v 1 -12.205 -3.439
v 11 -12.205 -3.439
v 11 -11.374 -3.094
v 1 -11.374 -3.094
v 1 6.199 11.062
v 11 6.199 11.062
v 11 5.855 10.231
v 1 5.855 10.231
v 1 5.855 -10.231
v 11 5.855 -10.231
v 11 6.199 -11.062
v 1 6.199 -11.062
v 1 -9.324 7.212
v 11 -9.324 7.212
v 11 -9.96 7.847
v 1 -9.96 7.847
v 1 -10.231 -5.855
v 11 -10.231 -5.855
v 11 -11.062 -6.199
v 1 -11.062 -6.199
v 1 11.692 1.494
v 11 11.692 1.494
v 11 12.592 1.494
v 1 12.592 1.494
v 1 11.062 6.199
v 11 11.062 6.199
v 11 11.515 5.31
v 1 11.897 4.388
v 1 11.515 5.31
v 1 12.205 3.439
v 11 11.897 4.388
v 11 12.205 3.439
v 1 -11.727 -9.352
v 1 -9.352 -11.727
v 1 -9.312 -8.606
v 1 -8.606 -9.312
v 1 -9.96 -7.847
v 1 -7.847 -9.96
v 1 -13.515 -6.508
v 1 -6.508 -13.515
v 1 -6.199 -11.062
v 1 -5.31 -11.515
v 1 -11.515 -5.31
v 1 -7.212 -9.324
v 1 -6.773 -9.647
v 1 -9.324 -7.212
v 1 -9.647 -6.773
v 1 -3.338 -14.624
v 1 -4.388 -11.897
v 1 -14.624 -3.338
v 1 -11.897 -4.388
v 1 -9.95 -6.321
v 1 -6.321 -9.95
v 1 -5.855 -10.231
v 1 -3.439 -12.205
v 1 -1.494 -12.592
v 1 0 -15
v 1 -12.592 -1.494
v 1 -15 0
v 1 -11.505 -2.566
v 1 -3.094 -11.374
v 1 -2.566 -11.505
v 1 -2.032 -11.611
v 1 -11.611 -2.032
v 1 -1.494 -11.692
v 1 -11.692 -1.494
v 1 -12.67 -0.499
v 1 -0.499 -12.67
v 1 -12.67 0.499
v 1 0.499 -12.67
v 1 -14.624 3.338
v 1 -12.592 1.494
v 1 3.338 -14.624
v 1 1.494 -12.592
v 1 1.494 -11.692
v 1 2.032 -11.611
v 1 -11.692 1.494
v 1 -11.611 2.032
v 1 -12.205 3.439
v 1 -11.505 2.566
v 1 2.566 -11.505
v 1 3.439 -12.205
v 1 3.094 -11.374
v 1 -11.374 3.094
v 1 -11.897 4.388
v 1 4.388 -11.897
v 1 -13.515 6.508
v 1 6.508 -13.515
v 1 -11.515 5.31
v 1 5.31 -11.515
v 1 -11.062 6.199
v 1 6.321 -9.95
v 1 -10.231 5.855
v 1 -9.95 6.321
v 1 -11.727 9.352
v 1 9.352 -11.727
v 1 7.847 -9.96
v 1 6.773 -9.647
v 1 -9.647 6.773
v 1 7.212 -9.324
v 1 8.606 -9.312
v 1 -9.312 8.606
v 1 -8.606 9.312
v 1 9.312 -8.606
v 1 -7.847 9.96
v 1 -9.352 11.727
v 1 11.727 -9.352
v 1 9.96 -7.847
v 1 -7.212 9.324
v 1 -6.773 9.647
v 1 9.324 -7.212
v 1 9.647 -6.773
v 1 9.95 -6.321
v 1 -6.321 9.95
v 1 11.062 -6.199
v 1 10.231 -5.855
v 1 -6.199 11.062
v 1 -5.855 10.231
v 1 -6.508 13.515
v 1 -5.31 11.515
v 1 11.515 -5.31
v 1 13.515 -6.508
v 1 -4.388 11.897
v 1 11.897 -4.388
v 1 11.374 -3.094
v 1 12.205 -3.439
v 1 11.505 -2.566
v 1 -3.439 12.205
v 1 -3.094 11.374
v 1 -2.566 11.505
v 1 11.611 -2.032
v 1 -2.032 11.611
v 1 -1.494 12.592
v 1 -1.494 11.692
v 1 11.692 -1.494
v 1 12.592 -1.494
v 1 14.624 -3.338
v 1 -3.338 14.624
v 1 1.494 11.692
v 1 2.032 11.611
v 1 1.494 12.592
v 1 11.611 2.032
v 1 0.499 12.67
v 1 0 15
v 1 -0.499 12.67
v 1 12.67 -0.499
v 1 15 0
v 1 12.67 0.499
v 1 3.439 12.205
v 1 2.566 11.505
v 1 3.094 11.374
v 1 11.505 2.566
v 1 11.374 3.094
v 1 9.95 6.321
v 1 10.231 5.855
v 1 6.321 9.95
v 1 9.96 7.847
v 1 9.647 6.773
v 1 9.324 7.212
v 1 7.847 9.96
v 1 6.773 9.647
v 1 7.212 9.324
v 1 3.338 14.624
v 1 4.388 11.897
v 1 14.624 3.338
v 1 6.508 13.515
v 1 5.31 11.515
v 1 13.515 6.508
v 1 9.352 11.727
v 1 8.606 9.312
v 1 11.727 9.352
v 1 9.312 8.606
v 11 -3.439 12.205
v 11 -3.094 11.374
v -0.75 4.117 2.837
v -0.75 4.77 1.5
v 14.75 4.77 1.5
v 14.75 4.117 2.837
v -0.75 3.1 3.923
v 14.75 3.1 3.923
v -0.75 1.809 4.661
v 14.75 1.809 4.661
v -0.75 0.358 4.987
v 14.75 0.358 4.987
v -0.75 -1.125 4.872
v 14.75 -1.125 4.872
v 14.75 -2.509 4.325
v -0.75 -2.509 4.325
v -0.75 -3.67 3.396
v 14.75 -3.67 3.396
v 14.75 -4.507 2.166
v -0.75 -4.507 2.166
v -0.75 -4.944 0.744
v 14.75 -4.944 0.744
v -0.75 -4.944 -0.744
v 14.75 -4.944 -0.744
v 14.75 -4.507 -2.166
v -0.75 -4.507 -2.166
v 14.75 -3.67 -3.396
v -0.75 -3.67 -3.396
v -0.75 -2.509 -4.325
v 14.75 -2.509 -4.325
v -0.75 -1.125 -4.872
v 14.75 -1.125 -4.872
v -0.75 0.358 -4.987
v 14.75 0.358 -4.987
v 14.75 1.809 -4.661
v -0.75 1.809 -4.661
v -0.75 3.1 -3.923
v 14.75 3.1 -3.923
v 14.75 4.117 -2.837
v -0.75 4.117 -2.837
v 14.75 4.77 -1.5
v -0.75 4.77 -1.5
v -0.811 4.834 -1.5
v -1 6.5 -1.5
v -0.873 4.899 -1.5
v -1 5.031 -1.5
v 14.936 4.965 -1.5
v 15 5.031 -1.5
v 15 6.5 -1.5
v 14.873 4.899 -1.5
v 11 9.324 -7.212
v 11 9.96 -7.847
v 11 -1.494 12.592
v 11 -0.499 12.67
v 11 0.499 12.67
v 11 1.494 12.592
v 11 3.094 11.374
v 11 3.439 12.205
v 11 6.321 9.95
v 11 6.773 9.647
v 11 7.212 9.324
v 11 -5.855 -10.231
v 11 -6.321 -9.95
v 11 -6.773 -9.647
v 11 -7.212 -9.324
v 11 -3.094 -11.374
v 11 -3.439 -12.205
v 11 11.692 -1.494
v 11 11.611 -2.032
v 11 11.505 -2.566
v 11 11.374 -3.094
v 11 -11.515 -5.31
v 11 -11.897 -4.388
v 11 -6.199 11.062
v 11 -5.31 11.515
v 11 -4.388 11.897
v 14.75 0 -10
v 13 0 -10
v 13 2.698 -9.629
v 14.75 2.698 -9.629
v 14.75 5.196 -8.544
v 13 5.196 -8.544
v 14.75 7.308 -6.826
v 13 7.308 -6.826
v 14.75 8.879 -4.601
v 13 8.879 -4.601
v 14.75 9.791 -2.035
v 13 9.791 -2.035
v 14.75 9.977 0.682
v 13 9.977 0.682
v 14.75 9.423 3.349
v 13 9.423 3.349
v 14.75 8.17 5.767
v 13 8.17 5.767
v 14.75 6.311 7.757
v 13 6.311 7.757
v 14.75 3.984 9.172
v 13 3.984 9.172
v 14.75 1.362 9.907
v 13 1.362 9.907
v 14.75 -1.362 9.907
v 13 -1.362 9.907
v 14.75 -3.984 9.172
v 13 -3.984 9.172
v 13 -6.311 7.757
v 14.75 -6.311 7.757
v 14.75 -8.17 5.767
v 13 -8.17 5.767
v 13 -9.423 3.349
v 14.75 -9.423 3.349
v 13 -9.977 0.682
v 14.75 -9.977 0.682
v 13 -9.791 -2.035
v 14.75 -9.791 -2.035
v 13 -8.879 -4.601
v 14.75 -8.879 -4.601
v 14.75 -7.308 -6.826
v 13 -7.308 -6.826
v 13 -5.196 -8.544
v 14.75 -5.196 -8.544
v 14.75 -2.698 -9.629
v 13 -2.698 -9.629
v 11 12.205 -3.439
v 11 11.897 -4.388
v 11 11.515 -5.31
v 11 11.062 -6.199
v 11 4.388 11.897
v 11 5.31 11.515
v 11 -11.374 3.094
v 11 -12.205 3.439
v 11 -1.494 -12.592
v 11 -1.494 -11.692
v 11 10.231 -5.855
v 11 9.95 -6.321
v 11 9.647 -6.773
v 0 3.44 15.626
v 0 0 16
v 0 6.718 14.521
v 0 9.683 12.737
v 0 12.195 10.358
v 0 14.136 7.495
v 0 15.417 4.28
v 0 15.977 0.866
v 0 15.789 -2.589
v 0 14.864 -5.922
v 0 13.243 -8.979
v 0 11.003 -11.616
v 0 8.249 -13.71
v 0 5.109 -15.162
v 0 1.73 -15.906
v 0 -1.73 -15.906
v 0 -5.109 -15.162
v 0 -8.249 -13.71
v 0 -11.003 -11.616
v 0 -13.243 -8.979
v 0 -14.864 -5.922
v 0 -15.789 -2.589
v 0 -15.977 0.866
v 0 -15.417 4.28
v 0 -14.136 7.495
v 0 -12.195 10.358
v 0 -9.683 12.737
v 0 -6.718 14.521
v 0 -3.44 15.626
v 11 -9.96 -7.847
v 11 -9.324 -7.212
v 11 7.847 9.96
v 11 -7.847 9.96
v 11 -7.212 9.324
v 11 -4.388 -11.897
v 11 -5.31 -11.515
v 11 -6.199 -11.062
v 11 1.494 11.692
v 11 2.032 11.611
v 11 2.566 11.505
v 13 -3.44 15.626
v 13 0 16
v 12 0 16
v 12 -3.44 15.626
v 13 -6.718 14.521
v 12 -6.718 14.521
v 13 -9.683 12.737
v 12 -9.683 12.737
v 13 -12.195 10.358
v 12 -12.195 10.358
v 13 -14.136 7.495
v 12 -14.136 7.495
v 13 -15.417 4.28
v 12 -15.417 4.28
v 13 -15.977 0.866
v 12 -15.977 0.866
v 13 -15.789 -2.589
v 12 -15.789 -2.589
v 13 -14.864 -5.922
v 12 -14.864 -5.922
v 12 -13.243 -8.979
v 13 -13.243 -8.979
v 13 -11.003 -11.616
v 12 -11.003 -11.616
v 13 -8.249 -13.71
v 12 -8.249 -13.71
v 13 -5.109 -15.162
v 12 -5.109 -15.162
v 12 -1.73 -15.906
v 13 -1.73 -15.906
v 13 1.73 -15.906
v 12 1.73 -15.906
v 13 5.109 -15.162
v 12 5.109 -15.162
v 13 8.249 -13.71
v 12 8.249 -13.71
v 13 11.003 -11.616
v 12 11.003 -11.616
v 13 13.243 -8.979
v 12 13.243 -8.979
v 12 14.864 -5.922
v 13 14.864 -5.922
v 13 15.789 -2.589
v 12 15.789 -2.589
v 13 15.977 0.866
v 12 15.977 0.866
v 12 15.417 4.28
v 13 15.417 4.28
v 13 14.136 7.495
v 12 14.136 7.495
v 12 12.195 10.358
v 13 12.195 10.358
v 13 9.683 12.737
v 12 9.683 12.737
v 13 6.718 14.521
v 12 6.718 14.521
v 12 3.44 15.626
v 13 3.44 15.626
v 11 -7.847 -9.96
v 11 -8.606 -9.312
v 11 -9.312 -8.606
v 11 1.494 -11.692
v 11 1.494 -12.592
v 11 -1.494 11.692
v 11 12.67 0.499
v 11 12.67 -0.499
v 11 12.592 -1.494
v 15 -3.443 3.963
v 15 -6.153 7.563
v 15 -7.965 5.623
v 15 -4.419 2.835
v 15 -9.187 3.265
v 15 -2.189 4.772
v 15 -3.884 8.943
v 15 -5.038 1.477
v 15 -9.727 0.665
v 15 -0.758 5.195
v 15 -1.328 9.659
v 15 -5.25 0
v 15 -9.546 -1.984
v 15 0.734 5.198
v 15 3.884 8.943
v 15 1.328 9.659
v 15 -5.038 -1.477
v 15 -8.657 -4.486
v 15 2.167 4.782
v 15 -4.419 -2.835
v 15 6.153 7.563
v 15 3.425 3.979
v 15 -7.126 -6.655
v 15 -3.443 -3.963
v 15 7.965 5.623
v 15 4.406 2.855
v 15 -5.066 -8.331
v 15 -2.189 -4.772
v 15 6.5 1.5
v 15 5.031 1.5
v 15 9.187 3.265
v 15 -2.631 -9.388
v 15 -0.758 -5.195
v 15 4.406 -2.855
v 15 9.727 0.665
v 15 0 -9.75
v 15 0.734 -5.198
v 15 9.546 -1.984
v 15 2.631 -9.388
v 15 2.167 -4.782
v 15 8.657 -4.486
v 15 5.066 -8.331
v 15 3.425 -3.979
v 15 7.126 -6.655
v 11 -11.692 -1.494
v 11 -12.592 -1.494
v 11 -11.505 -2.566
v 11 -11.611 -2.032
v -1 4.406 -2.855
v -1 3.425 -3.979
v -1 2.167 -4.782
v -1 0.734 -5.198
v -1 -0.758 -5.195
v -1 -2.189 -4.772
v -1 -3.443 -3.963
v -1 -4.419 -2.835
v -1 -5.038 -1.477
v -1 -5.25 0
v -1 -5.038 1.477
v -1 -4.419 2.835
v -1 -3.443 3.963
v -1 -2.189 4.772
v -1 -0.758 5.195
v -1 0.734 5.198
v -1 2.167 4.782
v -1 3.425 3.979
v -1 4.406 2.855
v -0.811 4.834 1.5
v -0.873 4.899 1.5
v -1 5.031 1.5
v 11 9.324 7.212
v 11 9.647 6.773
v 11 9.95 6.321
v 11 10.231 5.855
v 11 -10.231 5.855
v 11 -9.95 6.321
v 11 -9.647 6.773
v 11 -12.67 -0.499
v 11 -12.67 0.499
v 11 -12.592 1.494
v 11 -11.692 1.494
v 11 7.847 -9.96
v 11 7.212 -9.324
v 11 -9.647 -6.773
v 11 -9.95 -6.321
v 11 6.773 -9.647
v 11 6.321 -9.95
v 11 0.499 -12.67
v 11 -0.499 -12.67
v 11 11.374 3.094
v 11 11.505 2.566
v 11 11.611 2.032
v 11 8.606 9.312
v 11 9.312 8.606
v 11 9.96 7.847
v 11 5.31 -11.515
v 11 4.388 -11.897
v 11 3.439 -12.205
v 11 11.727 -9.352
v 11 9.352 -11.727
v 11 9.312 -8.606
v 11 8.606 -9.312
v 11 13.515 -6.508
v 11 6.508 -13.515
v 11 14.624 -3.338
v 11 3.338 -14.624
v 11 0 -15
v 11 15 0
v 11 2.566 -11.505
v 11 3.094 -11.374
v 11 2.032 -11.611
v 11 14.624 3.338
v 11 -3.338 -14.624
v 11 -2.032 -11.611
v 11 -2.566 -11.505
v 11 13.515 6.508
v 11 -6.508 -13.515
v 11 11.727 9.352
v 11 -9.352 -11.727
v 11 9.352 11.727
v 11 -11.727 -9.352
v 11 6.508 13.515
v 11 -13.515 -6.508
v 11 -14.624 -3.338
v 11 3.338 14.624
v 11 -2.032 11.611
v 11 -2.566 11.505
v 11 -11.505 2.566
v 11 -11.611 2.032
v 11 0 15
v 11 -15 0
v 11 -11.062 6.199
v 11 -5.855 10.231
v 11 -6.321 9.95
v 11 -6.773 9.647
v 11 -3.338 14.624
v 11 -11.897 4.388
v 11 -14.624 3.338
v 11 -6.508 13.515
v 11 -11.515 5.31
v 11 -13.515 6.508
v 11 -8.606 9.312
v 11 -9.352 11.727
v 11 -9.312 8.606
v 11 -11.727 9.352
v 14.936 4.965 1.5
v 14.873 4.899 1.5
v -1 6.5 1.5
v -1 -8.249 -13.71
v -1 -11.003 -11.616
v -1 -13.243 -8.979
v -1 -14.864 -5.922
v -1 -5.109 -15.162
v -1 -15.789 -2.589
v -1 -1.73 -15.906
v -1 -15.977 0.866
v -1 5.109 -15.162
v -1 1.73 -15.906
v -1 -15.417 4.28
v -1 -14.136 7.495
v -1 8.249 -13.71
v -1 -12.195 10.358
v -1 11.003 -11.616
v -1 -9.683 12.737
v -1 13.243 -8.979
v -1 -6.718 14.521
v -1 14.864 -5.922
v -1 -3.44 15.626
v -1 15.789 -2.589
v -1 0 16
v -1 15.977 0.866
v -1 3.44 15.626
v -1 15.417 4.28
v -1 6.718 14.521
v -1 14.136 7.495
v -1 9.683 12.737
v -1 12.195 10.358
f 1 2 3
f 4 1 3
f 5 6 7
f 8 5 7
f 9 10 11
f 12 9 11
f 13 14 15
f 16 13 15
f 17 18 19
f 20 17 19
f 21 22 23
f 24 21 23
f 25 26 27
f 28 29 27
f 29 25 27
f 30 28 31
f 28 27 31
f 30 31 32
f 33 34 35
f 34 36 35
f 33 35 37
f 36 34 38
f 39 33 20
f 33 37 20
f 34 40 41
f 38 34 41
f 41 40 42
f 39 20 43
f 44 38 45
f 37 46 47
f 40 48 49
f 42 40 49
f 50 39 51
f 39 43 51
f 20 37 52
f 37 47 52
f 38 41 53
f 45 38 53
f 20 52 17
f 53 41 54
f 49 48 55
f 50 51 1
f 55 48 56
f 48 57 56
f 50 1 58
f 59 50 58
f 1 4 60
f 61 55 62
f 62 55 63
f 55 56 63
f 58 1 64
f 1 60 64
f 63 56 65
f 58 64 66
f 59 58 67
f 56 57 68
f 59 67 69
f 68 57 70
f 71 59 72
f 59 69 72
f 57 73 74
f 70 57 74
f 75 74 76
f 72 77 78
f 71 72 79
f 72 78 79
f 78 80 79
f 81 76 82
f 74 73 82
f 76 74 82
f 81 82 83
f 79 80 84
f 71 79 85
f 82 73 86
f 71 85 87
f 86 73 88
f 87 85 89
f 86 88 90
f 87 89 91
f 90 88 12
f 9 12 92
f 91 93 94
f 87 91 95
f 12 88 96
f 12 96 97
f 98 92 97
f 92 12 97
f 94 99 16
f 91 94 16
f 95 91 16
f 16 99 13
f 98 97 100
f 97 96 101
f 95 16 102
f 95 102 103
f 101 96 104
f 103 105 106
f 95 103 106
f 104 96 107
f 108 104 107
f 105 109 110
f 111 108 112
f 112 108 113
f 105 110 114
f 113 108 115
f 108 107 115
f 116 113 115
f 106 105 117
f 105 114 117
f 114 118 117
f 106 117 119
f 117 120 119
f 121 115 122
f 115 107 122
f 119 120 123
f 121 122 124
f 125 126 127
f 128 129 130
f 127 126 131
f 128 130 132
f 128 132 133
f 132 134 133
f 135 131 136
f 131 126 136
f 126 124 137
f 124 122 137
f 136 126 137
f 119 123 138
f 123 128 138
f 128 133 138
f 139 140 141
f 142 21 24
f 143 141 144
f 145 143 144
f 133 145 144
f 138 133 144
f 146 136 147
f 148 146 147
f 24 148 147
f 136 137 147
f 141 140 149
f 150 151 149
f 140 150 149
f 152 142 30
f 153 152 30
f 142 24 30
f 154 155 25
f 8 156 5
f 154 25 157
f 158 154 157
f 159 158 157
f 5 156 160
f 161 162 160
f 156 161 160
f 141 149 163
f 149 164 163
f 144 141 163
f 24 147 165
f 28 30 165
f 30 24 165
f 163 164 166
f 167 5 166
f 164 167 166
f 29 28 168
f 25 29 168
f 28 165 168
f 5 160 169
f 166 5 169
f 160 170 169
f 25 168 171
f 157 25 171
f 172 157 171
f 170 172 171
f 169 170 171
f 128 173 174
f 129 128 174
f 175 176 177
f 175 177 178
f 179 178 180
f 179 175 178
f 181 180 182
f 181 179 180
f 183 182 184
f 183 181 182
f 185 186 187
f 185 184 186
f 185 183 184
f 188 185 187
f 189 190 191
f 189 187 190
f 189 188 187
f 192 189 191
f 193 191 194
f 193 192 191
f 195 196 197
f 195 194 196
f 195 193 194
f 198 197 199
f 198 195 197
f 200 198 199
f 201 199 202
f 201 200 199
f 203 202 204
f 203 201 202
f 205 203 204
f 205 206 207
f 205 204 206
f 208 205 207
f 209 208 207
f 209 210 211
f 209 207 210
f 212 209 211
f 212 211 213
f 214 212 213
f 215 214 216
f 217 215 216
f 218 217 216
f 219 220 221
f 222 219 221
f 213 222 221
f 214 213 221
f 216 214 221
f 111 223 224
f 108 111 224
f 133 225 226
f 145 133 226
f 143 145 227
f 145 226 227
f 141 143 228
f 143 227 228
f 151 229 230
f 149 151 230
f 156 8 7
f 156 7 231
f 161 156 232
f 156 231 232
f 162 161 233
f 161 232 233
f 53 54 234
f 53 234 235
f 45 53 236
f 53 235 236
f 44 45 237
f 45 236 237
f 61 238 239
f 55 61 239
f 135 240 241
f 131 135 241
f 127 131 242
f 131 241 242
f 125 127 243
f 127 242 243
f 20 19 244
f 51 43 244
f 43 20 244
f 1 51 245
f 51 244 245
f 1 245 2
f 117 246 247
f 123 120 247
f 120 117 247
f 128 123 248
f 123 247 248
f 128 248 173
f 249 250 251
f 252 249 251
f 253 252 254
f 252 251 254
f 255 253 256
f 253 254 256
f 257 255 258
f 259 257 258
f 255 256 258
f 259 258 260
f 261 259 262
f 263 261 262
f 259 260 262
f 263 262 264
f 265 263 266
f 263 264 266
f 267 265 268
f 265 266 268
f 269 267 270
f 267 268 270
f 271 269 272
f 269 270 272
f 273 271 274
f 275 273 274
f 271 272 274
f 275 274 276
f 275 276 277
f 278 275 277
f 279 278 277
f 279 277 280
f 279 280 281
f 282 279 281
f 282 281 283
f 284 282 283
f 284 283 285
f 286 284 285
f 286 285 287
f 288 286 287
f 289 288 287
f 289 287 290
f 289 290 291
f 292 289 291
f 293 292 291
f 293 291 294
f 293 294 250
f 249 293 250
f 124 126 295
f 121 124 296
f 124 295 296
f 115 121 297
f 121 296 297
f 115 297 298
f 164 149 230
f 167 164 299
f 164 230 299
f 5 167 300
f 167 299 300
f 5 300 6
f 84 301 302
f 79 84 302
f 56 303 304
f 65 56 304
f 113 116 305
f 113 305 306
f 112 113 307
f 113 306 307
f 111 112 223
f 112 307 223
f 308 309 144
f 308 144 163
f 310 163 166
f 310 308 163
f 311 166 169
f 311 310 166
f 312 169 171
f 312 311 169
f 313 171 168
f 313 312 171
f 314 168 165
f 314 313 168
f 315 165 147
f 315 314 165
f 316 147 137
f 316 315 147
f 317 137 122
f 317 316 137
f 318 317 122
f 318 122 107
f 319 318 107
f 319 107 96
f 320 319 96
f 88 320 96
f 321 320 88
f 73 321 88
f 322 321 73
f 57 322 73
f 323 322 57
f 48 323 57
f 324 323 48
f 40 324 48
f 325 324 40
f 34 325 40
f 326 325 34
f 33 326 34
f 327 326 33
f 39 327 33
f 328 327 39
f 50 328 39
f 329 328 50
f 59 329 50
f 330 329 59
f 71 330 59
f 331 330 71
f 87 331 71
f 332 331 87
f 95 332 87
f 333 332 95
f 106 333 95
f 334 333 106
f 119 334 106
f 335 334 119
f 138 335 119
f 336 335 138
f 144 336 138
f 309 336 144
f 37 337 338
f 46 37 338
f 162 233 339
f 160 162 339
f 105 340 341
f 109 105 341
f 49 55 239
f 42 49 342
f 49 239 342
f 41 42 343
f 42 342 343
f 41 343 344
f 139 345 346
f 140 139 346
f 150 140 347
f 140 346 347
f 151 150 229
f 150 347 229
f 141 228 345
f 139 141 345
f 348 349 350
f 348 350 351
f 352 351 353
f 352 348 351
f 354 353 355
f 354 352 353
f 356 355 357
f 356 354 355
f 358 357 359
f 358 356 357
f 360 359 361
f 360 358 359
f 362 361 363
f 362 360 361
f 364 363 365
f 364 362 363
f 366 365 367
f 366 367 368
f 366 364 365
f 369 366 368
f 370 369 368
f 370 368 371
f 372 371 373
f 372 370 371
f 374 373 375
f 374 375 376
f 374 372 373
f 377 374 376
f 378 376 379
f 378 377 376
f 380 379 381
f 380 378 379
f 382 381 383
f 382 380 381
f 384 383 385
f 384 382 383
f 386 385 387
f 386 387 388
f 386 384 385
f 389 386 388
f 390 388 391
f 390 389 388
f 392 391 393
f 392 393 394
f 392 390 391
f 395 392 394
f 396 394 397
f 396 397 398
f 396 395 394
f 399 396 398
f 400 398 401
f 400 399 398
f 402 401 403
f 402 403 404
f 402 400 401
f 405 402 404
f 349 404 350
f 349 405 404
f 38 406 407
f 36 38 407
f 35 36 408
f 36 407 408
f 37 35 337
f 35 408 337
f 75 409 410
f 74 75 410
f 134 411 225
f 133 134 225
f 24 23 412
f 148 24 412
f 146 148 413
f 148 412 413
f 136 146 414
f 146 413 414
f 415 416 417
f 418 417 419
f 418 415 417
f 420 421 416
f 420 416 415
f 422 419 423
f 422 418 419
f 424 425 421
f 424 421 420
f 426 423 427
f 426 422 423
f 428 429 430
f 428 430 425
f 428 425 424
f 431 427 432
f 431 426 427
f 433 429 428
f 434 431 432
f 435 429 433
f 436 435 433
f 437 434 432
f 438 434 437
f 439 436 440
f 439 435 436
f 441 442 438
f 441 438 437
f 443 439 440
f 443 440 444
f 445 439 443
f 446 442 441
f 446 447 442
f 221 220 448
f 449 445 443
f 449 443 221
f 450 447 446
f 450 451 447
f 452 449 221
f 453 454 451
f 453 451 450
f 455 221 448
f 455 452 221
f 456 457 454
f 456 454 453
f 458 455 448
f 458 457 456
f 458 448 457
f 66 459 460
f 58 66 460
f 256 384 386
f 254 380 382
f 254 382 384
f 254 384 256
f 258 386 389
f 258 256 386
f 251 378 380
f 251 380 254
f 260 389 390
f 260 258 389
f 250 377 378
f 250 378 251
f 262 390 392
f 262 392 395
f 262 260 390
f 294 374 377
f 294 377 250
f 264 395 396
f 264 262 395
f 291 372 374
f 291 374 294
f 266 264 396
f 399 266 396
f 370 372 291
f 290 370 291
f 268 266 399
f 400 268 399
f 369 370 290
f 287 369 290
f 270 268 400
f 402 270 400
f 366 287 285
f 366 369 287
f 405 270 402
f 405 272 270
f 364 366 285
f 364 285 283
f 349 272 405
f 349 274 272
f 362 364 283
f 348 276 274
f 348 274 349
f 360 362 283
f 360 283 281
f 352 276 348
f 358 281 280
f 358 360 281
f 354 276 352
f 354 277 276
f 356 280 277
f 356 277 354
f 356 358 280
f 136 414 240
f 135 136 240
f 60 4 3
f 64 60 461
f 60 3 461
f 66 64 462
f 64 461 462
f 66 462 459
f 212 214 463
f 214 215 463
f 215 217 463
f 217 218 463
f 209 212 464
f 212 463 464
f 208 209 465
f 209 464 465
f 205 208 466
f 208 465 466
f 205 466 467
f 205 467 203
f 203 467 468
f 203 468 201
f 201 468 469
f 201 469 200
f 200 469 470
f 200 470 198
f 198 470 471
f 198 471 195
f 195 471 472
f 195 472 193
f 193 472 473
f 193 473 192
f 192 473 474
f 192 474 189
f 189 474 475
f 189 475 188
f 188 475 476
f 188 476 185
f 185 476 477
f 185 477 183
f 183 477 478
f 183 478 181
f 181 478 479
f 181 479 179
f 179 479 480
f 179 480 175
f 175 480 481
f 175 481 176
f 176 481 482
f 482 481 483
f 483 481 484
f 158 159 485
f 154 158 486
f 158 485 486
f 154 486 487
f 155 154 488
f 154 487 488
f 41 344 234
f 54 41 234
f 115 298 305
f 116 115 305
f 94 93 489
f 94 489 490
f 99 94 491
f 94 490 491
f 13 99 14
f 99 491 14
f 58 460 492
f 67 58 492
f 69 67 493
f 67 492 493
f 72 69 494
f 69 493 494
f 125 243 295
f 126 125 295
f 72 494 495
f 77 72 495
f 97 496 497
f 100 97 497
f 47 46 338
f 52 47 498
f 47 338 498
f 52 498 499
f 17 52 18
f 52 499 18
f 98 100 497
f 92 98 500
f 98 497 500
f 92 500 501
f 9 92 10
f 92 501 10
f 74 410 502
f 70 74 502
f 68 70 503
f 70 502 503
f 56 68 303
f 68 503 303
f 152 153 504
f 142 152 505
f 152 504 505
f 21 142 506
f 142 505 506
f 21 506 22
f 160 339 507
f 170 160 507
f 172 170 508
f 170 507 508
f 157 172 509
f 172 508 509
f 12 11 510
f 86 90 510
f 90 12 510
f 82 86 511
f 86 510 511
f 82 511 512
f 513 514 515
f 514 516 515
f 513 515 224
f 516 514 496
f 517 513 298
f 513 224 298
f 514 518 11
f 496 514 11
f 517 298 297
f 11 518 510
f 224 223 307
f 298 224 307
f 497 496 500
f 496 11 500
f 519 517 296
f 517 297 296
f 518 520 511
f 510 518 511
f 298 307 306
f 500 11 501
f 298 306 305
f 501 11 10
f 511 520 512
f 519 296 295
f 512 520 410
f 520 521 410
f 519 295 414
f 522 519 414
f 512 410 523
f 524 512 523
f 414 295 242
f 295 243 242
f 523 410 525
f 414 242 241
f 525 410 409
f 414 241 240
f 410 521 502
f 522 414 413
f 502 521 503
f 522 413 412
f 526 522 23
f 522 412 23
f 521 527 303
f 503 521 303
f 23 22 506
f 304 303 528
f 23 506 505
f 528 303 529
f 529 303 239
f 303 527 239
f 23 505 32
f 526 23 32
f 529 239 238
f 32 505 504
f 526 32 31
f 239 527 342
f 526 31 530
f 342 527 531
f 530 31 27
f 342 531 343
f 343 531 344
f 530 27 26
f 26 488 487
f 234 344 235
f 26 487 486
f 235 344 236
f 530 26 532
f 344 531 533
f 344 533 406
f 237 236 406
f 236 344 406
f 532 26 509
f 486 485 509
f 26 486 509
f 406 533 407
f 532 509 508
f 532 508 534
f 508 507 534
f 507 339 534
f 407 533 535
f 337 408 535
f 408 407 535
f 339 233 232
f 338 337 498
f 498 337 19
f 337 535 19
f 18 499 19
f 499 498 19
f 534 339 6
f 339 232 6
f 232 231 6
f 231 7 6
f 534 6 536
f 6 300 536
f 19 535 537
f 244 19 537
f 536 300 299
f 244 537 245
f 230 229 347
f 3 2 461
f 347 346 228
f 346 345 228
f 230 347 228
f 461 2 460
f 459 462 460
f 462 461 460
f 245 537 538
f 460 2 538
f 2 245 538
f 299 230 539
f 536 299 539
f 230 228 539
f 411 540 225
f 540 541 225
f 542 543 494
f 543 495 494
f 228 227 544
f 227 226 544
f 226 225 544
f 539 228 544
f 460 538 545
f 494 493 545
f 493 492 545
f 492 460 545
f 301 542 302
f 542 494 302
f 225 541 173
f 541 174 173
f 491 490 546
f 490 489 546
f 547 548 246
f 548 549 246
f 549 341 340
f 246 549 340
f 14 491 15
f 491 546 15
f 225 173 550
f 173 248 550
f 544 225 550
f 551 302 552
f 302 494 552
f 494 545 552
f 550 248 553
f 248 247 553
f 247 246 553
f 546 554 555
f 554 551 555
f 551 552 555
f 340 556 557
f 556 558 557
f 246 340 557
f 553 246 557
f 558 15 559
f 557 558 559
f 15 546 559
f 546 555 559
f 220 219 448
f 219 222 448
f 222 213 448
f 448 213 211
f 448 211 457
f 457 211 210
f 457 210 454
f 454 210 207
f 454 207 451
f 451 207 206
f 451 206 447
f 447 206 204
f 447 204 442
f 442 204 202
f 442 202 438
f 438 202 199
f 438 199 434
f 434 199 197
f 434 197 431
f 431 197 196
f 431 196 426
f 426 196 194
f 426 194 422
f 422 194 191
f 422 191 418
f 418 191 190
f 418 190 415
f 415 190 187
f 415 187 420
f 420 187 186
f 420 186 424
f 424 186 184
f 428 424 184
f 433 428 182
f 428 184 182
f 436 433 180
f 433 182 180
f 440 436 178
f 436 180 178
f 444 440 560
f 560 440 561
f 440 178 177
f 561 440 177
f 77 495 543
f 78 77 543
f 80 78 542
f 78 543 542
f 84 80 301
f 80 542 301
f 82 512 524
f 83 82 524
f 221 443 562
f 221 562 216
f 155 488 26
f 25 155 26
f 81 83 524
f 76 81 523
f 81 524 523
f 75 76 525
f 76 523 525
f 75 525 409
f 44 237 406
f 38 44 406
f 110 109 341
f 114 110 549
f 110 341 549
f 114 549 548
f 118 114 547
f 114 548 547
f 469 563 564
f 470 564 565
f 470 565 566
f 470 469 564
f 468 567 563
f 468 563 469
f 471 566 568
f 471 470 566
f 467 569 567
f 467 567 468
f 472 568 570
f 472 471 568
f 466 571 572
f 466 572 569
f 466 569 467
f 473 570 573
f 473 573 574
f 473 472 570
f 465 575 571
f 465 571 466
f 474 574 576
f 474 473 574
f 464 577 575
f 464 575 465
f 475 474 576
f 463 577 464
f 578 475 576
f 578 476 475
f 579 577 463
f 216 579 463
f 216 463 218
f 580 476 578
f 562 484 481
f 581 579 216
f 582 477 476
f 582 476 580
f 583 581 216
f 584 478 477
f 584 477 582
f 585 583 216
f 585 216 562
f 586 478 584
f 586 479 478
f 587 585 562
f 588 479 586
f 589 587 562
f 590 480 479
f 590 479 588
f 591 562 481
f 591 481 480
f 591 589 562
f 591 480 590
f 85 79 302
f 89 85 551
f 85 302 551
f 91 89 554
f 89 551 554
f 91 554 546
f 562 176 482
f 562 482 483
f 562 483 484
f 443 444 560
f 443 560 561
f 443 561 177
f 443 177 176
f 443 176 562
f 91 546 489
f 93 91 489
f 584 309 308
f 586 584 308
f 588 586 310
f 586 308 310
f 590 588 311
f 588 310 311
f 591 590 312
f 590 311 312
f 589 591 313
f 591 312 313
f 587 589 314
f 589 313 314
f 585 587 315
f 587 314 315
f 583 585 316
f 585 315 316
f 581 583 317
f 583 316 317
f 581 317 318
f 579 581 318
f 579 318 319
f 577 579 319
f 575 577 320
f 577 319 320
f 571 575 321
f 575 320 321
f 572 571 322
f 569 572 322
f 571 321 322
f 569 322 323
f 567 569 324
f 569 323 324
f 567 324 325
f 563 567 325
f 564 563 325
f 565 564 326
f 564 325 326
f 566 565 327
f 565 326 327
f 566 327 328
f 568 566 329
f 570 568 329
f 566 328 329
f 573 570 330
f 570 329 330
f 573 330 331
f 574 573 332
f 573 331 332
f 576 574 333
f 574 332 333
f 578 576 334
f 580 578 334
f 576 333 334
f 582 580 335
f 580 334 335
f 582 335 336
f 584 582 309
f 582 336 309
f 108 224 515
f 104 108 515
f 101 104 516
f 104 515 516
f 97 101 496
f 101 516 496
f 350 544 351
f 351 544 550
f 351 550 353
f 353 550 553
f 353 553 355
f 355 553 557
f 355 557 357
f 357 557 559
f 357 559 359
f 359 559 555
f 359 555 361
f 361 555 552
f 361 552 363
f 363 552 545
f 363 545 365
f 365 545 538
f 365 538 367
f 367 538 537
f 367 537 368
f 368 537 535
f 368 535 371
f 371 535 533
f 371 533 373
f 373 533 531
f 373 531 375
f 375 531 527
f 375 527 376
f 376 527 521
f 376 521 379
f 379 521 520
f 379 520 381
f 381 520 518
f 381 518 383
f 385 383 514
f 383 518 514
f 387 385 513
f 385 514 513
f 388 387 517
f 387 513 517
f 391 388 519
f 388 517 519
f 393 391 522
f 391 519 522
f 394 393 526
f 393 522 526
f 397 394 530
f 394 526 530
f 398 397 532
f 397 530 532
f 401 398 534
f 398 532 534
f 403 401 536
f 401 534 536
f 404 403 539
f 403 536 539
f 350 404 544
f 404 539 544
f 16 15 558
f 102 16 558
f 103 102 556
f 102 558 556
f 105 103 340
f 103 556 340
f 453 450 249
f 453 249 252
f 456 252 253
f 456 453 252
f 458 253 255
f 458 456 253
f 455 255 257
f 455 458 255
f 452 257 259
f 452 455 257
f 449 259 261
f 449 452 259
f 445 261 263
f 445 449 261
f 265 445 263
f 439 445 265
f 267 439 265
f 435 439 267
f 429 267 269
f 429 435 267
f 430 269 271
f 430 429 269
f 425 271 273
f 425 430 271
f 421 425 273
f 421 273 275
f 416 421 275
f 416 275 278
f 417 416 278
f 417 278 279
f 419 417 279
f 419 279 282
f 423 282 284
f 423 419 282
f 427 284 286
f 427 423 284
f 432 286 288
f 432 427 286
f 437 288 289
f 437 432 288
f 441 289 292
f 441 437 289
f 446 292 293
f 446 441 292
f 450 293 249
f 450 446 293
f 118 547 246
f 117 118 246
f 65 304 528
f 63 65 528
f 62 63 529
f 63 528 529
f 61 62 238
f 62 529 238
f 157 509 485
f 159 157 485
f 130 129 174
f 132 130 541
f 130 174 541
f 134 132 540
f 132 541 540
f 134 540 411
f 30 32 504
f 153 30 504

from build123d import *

# Parameters (mm, degrees)
BOSS_EXTRUDE1_START       = -13
BOSS_EXTRUDE1_DEPTH       = 14
BOSS_EXTRUDE1_START_2     = -25
BOSS_EXTRUDE1_2_OUTLINE_R = 9
BOSS_EXTRUDE1_2_DEPTH     = 12
BOSS_EXTRUDE1_START_3     = -1
BOSS_EXTRUDE1_3_OUTLINE_R = 16
BOSS_EXTRUDE1_3_DEPTH     = 2
BOSS_EXTRUDE1_4_OUTLINE_R = 14.25
BOSS_EXTRUDE1_4_DEPTH     = 0.9999999
SKETCH5_R                 = 16
BOSS_EXTRUDE3_DEPTH       = 2
SKETCH6_R                 = 10
BOSS_EXTRUDE4_DEPTH       = 12
CHAMFER1_SIZE             = 1
CUT_EXTRUDE1_START        = -10
SKETCH2_R                 = 10
SKETCH2_R_2               = 7.5
CUT_EXTRUDE1_DEPTH        = 10
CUT_EXTRUDE2_DEPTH        = 28.712812921
CUT_EXTRUDE2_DEPTH_BACK   = 28.712812921
SKETCH4_R                 = 5
CUT_EXTRUDE3_START        = -10
SKETCH7_R                 = 7.5
CUT_EXTRUDE3_DEPTH        = 10
CHAMFER2_SIZE             = 0.25
SKETCH8_W                 = 3
SKETCH8_H                 = 3
CUT_EXTRUDE4_DEPTH        = 28.712812921


with BuildPart() as part:
    # Boss-Extrude1: read off the stored shape, not the designer's step
    # Boss-Extrude1 outline → Boss-Extrude1 (new body)
    with BuildSketch(Plane.ZY.offset(BOSS_EXTRUDE1_START)):
        with BuildLine():
            ThreePointArc((-1.493827307, 11.692460658), (-2.299627171, 11.561006493), (-3.094394503, 11.374088047))
            Line((-3.094394503, 11.374088047), (-3.438518062, 12.20487581))
            ThreePointArc((-3.438518062, 12.20487581), (-4.852425922, 11.714792472), (-6.19875101, 11.061549888))
            Line((-6.19875101, 11.061549888), (-5.854627451, 10.230762125))
            ThreePointArc((-5.854627451, 10.230762125), (-6.548784122, 9.800948055), (-7.211522801, 9.324113638))
            Line((-7.211522801, 9.324113638), (-7.847380226, 9.959971063))
            ThreePointArc((-7.847380226, 9.959971063), (-8.966113985, 8.966113985), (-9.959971063, 7.847380226))
            Line((-9.959971063, 7.847380226), (-9.324113638, 7.211522801))
            ThreePointArc((-9.324113638, 7.211522801), (-9.800948055, 6.548784122), (-10.230762125, 5.854627451))
            Line((-10.230762125, 5.854627451), (-11.061549888, 6.19875101))
            ThreePointArc((-11.061549888, 6.19875101), (-11.714792472, 4.852425922), (-12.20487581, 3.438518062))
            Line((-12.20487581, 3.438518062), (-11.374088047, 3.094394503))
            ThreePointArc((-11.374088047, 3.094394503), (-11.561006493, 2.299627171), (-11.692460658, 1.493827307))
            Line((-11.692460658, 1.493827307), (-12.591698852, 1.493827307))
            ThreePointArc((-12.591698852, 1.493827307), (-12.68, 0), (-12.591698852, -1.493827307))
            Line((-12.591698852, -1.493827307), (-11.692460658, -1.493827307))
            ThreePointArc((-11.692460658, -1.493827307), (-11.561006493, -2.299627171), (-11.374088047, -3.094394503))
            Line((-11.374088047, -3.094394503), (-12.20487581, -3.438518062))
            ThreePointArc((-12.20487581, -3.438518062), (-11.714792472, -4.852425922), (-11.061549888, -6.19875101))
            Line((-11.061549888, -6.19875101), (-10.230762125, -5.854627451))
            ThreePointArc((-10.230762125, -5.854627451), (-9.800948055, -6.548784122), (-9.324113638, -7.211522801))
            Line((-9.324113638, -7.211522801), (-9.959971063, -7.847380226))
            ThreePointArc((-9.959971063, -7.847380226), (-8.966113985, -8.966113985), (-7.847380226, -9.959971063))
            Line((-7.847380226, -9.959971063), (-7.211522801, -9.324113638))
            ThreePointArc((-7.211522801, -9.324113638), (-6.548784122, -9.800948055), (-5.854627451, -10.230762125))
            Line((-5.854627451, -10.230762125), (-6.19875101, -11.061549888))
            ThreePointArc((-6.19875101, -11.061549888), (-4.852425922, -11.714792472), (-3.438518062, -12.20487581))
            Line((-3.438518062, -12.20487581), (-3.094394503, -11.374088047))
            ThreePointArc((-3.094394503, -11.374088047), (-2.299627171, -11.561006493), (-1.493827307, -11.692460658))
            Line((-1.493827307, -11.692460658), (-1.493827307, -12.591698852))
            ThreePointArc((-1.493827307, -12.591698852), (0, -12.68), (1.493827307, -12.591698852))
            Line((1.493827307, -12.591698852), (1.493827307, -11.692460658))
            ThreePointArc((1.493827307, -11.692460658), (2.299627171, -11.561006493), (3.094394503, -11.374088047))
            Line((3.094394503, -11.374088047), (3.438518062, -12.20487581))
            ThreePointArc((3.438518062, -12.20487581), (4.852425922, -11.714792472), (6.19875101, -11.061549888))
            Line((6.19875101, -11.061549888), (5.854627451, -10.230762125))
            ThreePointArc((5.854627451, -10.230762125), (6.548784122, -9.800948055), (7.211522801, -9.324113638))
            Line((7.211522801, -9.324113638), (7.847380226, -9.959971063))
            ThreePointArc((7.847380226, -9.959971063), (8.966113985, -8.966113985), (9.959971063, -7.847380226))
            Line((9.959971063, -7.847380226), (9.324113638, -7.211522801))
            ThreePointArc((9.324113638, -7.211522801), (9.800948055, -6.548784122), (10.230762125, -5.854627451))
            Line((10.230762125, -5.854627451), (11.061549888, -6.19875101))
            ThreePointArc((11.061549888, -6.19875101), (11.714792472, -4.852425922), (12.20487581, -3.438518062))
            Line((12.20487581, -3.438518062), (11.374088047, -3.094394503))
            ThreePointArc((11.374088047, -3.094394503), (11.561006493, -2.299627171), (11.692460658, -1.493827307))
            Line((11.692460658, -1.493827307), (12.591698852, -1.493827307))
            ThreePointArc((12.591698852, -1.493827307), (12.68, 0), (12.591698852, 1.493827307))
            Line((12.591698852, 1.493827307), (11.692460658, 1.493827307))
            ThreePointArc((11.692460658, 1.493827307), (11.561006493, 2.299627171), (11.374088047, 3.094394503))
            Line((11.374088047, 3.094394503), (12.20487581, 3.438518062))
            ThreePointArc((12.20487581, 3.438518062), (11.714792472, 4.852425922), (11.061549888, 6.19875101))
            Line((11.061549888, 6.19875101), (10.230762125, 5.854627451))
            ThreePointArc((10.230762125, 5.854627451), (9.800948055, 6.548784122), (9.324113638, 7.211522801))
            Line((9.324113638, 7.211522801), (9.959971063, 7.847380226))
            ThreePointArc((9.959971063, 7.847380226), (8.966113985, 8.966113985), (7.847380226, 9.959971063))
            Line((7.847380226, 9.959971063), (7.211522801, 9.324113638))
            ThreePointArc((7.211522801, 9.324113638), (6.548784122, 9.800948055), (5.854627451, 10.230762125))
            Line((5.854627451, 10.230762125), (6.19875101, 11.061549888))
            ThreePointArc((6.19875101, 11.061549888), (4.852425922, 11.714792472), (3.438518062, 12.20487581))
            Line((3.438518062, 12.20487581), (3.094394503, 11.374088047))
            ThreePointArc((3.094394503, 11.374088047), (2.299627171, 11.561006493), (1.493827307, 11.692460658))
            Line((1.493827307, 11.692460658), (1.493827307, 12.591698852))
            ThreePointArc((1.493827307, 12.591698852), (0, 12.68), (-1.493827307, 12.591698852))
            Line((-1.493827307, 12.591698852), (-1.493827307, 11.692460658))
        make_face()
    extrude(amount=BOSS_EXTRUDE1_DEPTH)

    # Boss-Extrude1 2 outline → Boss-Extrude1 2 (add)
    with BuildSketch(Plane.ZY.offset(BOSS_EXTRUDE1_START_2)):
        Circle(BOSS_EXTRUDE1_2_OUTLINE_R)
    extrude(amount=BOSS_EXTRUDE1_2_DEPTH)

    # Boss-Extrude1 3 outline → Boss-Extrude1 3 (add)
    with BuildSketch(Plane.ZY.offset(BOSS_EXTRUDE1_START_3)):
        Circle(BOSS_EXTRUDE1_3_OUTLINE_R)
        with BuildLine():
            Line((-3.438518062, 12.20487581), (-3.094394503, 11.374088047))
            ThreePointArc((-3.094394503, 11.374088047), (-2.299627171, 11.561006493), (-1.493827307, 11.692460658))
            Line((-1.493827307, 11.692460658), (-1.493827307, 12.591698852))
            ThreePointArc((-1.493827307, 12.591698852), (0, 12.68), (1.493827307, 12.591698852))
            Line((1.493827307, 12.591698852), (1.493827307, 11.692460658))
            ThreePointArc((1.493827307, 11.692460658), (2.299627171, 11.561006493), (3.094394503, 11.374088047))
            Line((3.094394503, 11.374088047), (3.438518062, 12.20487581))
            ThreePointArc((3.438518062, 12.20487581), (4.852425922, 11.714792472), (6.19875101, 11.061549888))
            Line((6.19875101, 11.061549888), (5.854627451, 10.230762125))
            ThreePointArc((5.854627451, 10.230762125), (6.548784122, 9.800948055), (7.211522801, 9.324113638))
            Line((7.211522801, 9.324113638), (7.847380226, 9.959971063))
            ThreePointArc((7.847380226, 9.959971063), (8.966113985, 8.966113985), (9.959971063, 7.847380226))
            Line((9.959971063, 7.847380226), (9.324113638, 7.211522801))
            ThreePointArc((9.324113638, 7.211522801), (9.800948055, 6.548784122), (10.230762125, 5.854627451))
            Line((10.230762125, 5.854627451), (11.061549888, 6.19875101))
            ThreePointArc((11.061549888, 6.19875101), (11.714792472, 4.852425922), (12.20487581, 3.438518062))
            Line((12.20487581, 3.438518062), (11.374088047, 3.094394503))
            ThreePointArc((11.374088047, 3.094394503), (11.561006493, 2.299627171), (11.692460658, 1.493827307))
            Line((11.692460658, 1.493827307), (12.591698852, 1.493827307))
            ThreePointArc((12.591698852, 1.493827307), (12.68, 0), (12.591698852, -1.493827307))
            Line((12.591698852, -1.493827307), (11.692460658, -1.493827307))
            ThreePointArc((11.692460658, -1.493827307), (11.561006493, -2.299627171), (11.374088047, -3.094394503))
            Line((11.374088047, -3.094394503), (12.20487581, -3.438518062))
            ThreePointArc((12.20487581, -3.438518062), (11.714792472, -4.852425922), (11.061549888, -6.19875101))
            Line((11.061549888, -6.19875101), (10.230762125, -5.854627451))
            ThreePointArc((10.230762125, -5.854627451), (9.800948055, -6.548784122), (9.324113638, -7.211522801))
            Line((9.324113638, -7.211522801), (9.959971063, -7.847380226))
            ThreePointArc((9.959971063, -7.847380226), (8.966113985, -8.966113985), (7.847380226, -9.959971063))
            Line((7.847380226, -9.959971063), (7.211522801, -9.324113638))
            ThreePointArc((7.211522801, -9.324113638), (6.548784122, -9.800948055), (5.854627451, -10.230762125))
            Line((5.854627451, -10.230762125), (6.19875101, -11.061549888))
            ThreePointArc((6.19875101, -11.061549888), (4.852425922, -11.714792472), (3.438518062, -12.20487581))
            Line((3.438518062, -12.20487581), (3.094394503, -11.374088047))
            ThreePointArc((3.094394503, -11.374088047), (2.299627171, -11.561006493), (1.493827307, -11.692460658))
            Line((1.493827307, -11.692460658), (1.493827307, -12.591698852))
            ThreePointArc((1.493827307, -12.591698852), (0, -12.68), (-1.493827307, -12.591698852))
            Line((-1.493827307, -12.591698852), (-1.493827307, -11.692460658))
            ThreePointArc((-1.493827307, -11.692460658), (-2.299627171, -11.561006493), (-3.094394503, -11.374088047))
            Line((-3.094394503, -11.374088047), (-3.438518062, -12.20487581))
            ThreePointArc((-3.438518062, -12.20487581), (-4.852425922, -11.714792472), (-6.19875101, -11.061549888))
            Line((-6.19875101, -11.061549888), (-5.854627451, -10.230762125))
            ThreePointArc((-5.854627451, -10.230762125), (-6.548784122, -9.800948055), (-7.211522801, -9.324113638))
            Line((-7.211522801, -9.324113638), (-7.847380226, -9.959971063))
            ThreePointArc((-7.847380226, -9.959971063), (-8.966113985, -8.966113985), (-9.959971063, -7.847380226))
            Line((-9.959971063, -7.847380226), (-9.324113638, -7.211522801))
            ThreePointArc((-9.324113638, -7.211522801), (-9.800948055, -6.548784122), (-10.230762125, -5.854627451))
            Line((-10.230762125, -5.854627451), (-11.061549888, -6.19875101))
            ThreePointArc((-11.061549888, -6.19875101), (-11.714792472, -4.852425922), (-12.20487581, -3.438518062))
            Line((-12.20487581, -3.438518062), (-11.374088047, -3.094394503))
            ThreePointArc((-11.374088047, -3.094394503), (-11.561006493, -2.299627171), (-11.692460658, -1.493827307))
            Line((-11.692460658, -1.493827307), (-12.591698852, -1.493827307))
            ThreePointArc((-12.591698852, -1.493827307), (-12.68, 0), (-12.591698852, 1.493827307))
            Line((-12.591698852, 1.493827307), (-11.692460658, 1.493827307))
            ThreePointArc((-11.692460658, 1.493827307), (-11.561006493, 2.299627171), (-11.374088047, 3.094394503))
            Line((-11.374088047, 3.094394503), (-12.20487581, 3.438518062))
            ThreePointArc((-12.20487581, 3.438518062), (-11.714792472, 4.852425922), (-11.061549888, 6.19875101))
            Line((-11.061549888, 6.19875101), (-10.230762125, 5.854627451))
            ThreePointArc((-10.230762125, 5.854627451), (-9.800948055, 6.548784122), (-9.324113638, 7.211522801))
            Line((-9.324113638, 7.211522801), (-9.959971063, 7.847380226))
            ThreePointArc((-9.959971063, 7.847380226), (-8.966113985, 8.966113985), (-7.847380226, 9.959971063))
            Line((-7.847380226, 9.959971063), (-7.211522801, 9.324113638))
            ThreePointArc((-7.211522801, 9.324113638), (-6.548784122, 9.800948055), (-5.854627451, 10.230762125))
            Line((-5.854627451, 10.230762125), (-6.19875101, 11.061549888))
            ThreePointArc((-6.19875101, 11.061549888), (-4.852425922, 11.714792472), (-3.438518062, 12.20487581))
        make_face(mode=Mode.SUBTRACT)
    extrude(amount=BOSS_EXTRUDE1_3_DEPTH)

    # Boss-Extrude1 4 outline → Boss-Extrude1 4 (add)
    with BuildSketch(Plane.ZY.offset(BOSS_EXTRUDE1_START)):
        Circle(BOSS_EXTRUDE1_4_OUTLINE_R)
        with BuildLine():
            Line((-3.438518062, 12.20487581), (-3.094394503, 11.374088047))
            ThreePointArc((-3.094394503, 11.374088047), (-2.299627171, 11.561006493), (-1.493827307, 11.692460658))
            Line((-1.493827307, 11.692460658), (-1.493827307, 12.591698852))
            ThreePointArc((-1.493827307, 12.591698852), (0, 12.68), (1.493827307, 12.591698852))
            Line((1.493827307, 12.591698852), (1.493827307, 11.692460658))
            ThreePointArc((1.493827307, 11.692460658), (2.299627171, 11.561006493), (3.094394503, 11.374088047))
            Line((3.094394503, 11.374088047), (3.438518062, 12.20487581))
            ThreePointArc((3.438518062, 12.20487581), (4.852425922, 11.714792472), (6.19875101, 11.061549888))
            Line((6.19875101, 11.061549888), (5.854627451, 10.230762125))
            ThreePointArc((5.854627451, 10.230762125), (6.548784122, 9.800948055), (7.211522801, 9.324113638))
            Line((7.211522801, 9.324113638), (7.847380226, 9.959971063))
            ThreePointArc((7.847380226, 9.959971063), (8.966113985, 8.966113985), (9.959971063, 7.847380226))
            Line((9.959971063, 7.847380226), (9.324113638, 7.211522801))
            ThreePointArc((9.324113638, 7.211522801), (9.800948055, 6.548784122), (10.230762125, 5.854627451))
            Line((10.230762125, 5.854627451), (11.061549888, 6.19875101))
            ThreePointArc((11.061549888, 6.19875101), (11.714792472, 4.852425922), (12.20487581, 3.438518062))
            Line((12.20487581, 3.438518062), (11.374088047, 3.094394503))
            ThreePointArc((11.374088047, 3.094394503), (11.561006493, 2.299627171), (11.692460658, 1.493827307))
            Line((11.692460658, 1.493827307), (12.591698852, 1.493827307))
            ThreePointArc((12.591698852, 1.493827307), (12.68, 0), (12.591698852, -1.493827307))
            Line((12.591698852, -1.493827307), (11.692460658, -1.493827307))
            ThreePointArc((11.692460658, -1.493827307), (11.561006493, -2.299627171), (11.374088047, -3.094394503))
            Line((11.374088047, -3.094394503), (12.20487581, -3.438518062))
            ThreePointArc((12.20487581, -3.438518062), (11.714792472, -4.852425922), (11.061549888, -6.19875101))
            Line((11.061549888, -6.19875101), (10.230762125, -5.854627451))
            ThreePointArc((10.230762125, -5.854627451), (9.800948055, -6.548784122), (9.324113638, -7.211522801))
            Line((9.324113638, -7.211522801), (9.959971063, -7.847380226))
            ThreePointArc((9.959971063, -7.847380226), (8.966113985, -8.966113985), (7.847380226, -9.959971063))
            Line((7.847380226, -9.959971063), (7.211522801, -9.324113638))
            ThreePointArc((7.211522801, -9.324113638), (6.548784122, -9.800948055), (5.854627451, -10.230762125))
            Line((5.854627451, -10.230762125), (6.19875101, -11.061549888))
            ThreePointArc((6.19875101, -11.061549888), (4.852425922, -11.714792472), (3.438518062, -12.20487581))
            Line((3.438518062, -12.20487581), (3.094394503, -11.374088047))
            ThreePointArc((3.094394503, -11.374088047), (2.299627171, -11.561006493), (1.493827307, -11.692460658))
            Line((1.493827307, -11.692460658), (1.493827307, -12.591698852))
            ThreePointArc((1.493827307, -12.591698852), (0, -12.68), (-1.493827307, -12.591698852))
            Line((-1.493827307, -12.591698852), (-1.493827307, -11.692460658))
            ThreePointArc((-1.493827307, -11.692460658), (-2.299627171, -11.561006493), (-3.094394503, -11.374088047))
            Line((-3.094394503, -11.374088047), (-3.438518062, -12.20487581))
            ThreePointArc((-3.438518062, -12.20487581), (-4.852425922, -11.714792472), (-6.19875101, -11.061549888))
            Line((-6.19875101, -11.061549888), (-5.854627451, -10.230762125))
            ThreePointArc((-5.854627451, -10.230762125), (-6.548784122, -9.800948055), (-7.211522801, -9.324113638))
            Line((-7.211522801, -9.324113638), (-7.847380226, -9.959971063))
            ThreePointArc((-7.847380226, -9.959971063), (-8.966113985, -8.966113985), (-9.959971063, -7.847380226))
            Line((-9.959971063, -7.847380226), (-9.324113638, -7.211522801))
            ThreePointArc((-9.324113638, -7.211522801), (-9.800948055, -6.548784122), (-10.230762125, -5.854627451))
            Line((-10.230762125, -5.854627451), (-11.061549888, -6.19875101))
            ThreePointArc((-11.061549888, -6.19875101), (-11.714792472, -4.852425922), (-12.20487581, -3.438518062))
            Line((-12.20487581, -3.438518062), (-11.374088047, -3.094394503))
            ThreePointArc((-11.374088047, -3.094394503), (-11.561006493, -2.299627171), (-11.692460658, -1.493827307))
            Line((-11.692460658, -1.493827307), (-12.591698852, -1.493827307))
            ThreePointArc((-12.591698852, -1.493827307), (-12.68, 0), (-12.591698852, 1.493827307))
            Line((-12.591698852, 1.493827307), (-11.692460658, 1.493827307))
            ThreePointArc((-11.692460658, 1.493827307), (-11.561006493, 2.299627171), (-11.374088047, 3.094394503))
            Line((-11.374088047, 3.094394503), (-12.20487581, 3.438518062))
            ThreePointArc((-12.20487581, 3.438518062), (-11.714792472, 4.852425922), (-11.061549888, 6.19875101))
            Line((-11.061549888, 6.19875101), (-10.230762125, 5.854627451))
            ThreePointArc((-10.230762125, 5.854627451), (-9.800948055, 6.548784122), (-9.324113638, 7.211522801))
            Line((-9.324113638, 7.211522801), (-9.959971063, 7.847380226))
            ThreePointArc((-9.959971063, 7.847380226), (-8.966113985, 8.966113985), (-7.847380226, 9.959971063))
            Line((-7.847380226, 9.959971063), (-7.211522801, 9.324113638))
            ThreePointArc((-7.211522801, 9.324113638), (-6.548784122, 9.800948055), (-5.854627451, 10.230762125))
            Line((-5.854627451, 10.230762125), (-6.19875101, 11.061549888))
            ThreePointArc((-6.19875101, 11.061549888), (-4.852425922, 11.714792472), (-3.438518062, 12.20487581))
        make_face(mode=Mode.SUBTRACT)
    extrude(amount=BOSS_EXTRUDE1_4_DEPTH)

    # Boss-Extrude1 5 outline → Boss-Extrude1 5 (revolve)
    with BuildSketch(Plane.YX):
        Polygon((11.7875, 12.0000001), (11.7875, 11), (13.25, 11), (14.25, 12), align=None)
    revolve(axis=Axis((0, 0, 0), (1, 0, 0)))

    # Sketch5 → Boss-Extrude3 (add)
    with BuildSketch(Plane(origin=(13, 0, 0), x_dir=(0, 0, -1), z_dir=(1, 0, 0))):
        with Locations(Location((0, 0, 0), (0, 0, 180))):
            Circle(SKETCH5_R)
    extrude(amount=-BOSS_EXTRUDE3_DEPTH)

    # Sketch6 → Boss-Extrude4 (add)
    with BuildSketch(Plane(origin=(13, 0, 0), x_dir=(0, 0, -1), z_dir=(1, 0, 0))):
        Circle(SKETCH6_R)
    extrude(amount=BOSS_EXTRUDE4_DEPTH)

    # Chamfer1
    chamfer1_edges = [part.edges().sort_by_distance(p)[0] for p in [
        (1, 0, -16),
        (11, 0, -16),
    ]]
    chamfer(chamfer1_edges, length=CHAMFER1_SIZE)

    # Sketch2 → Cut-Extrude1 (cut)
    with BuildSketch(Plane(origin=(25, 0, 0), x_dir=(0, 0, -1), z_dir=(1, 0, 0)).offset(CUT_EXTRUDE1_START)):
        Circle(SKETCH2_R)
        Circle(SKETCH2_R_2, mode=Mode.SUBTRACT)
    extrude(amount=CUT_EXTRUDE1_DEPTH, mode=Mode.SUBTRACT)

    # Sketch4 → Cut-Extrude2 (cut, two sides: drawn at the far end of the back side and taken through both)
    with BuildSketch(Plane(origin=(15, 0, 0), x_dir=(0, 0, -1), z_dir=(1, 0, 0)).offset(-CUT_EXTRUDE2_DEPTH_BACK)):
        Circle(SKETCH4_R)
    extrude(amount=CUT_EXTRUDE2_DEPTH + CUT_EXTRUDE2_DEPTH_BACK, mode=Mode.SUBTRACT)

    # Sketch7 → Cut-Extrude3 (cut)
    with BuildSketch(Plane(origin=(25, 0, 0), x_dir=(0, 0, -1), z_dir=(1, 0, 0)).offset(CUT_EXTRUDE3_START)):
        Circle(SKETCH7_R)
    extrude(amount=CUT_EXTRUDE3_DEPTH, mode=Mode.SUBTRACT)

    # Chamfer2
    chamfer2_edges = [part.edges().sort_by_distance(p)[0] for p in [
        (15, 0, 10),
        (-1, 0, 5),
        (15, 0, 5),
    ]]
    chamfer(chamfer2_edges, length=CHAMFER2_SIZE)

    # Sketch8 → Cut-Extrude4 (cut, through all)
    with BuildSketch(Plane(origin=(15, 0, 0), x_dir=(0, 0, -1), z_dir=(1, 0, 0))):
        with Locations((0, 5)):
            Rectangle(SKETCH8_W, SKETCH8_H)
    extrude(amount=-CUT_EXTRUDE4_DEPTH, mode=Mode.SUBTRACT)


solid = part.part
